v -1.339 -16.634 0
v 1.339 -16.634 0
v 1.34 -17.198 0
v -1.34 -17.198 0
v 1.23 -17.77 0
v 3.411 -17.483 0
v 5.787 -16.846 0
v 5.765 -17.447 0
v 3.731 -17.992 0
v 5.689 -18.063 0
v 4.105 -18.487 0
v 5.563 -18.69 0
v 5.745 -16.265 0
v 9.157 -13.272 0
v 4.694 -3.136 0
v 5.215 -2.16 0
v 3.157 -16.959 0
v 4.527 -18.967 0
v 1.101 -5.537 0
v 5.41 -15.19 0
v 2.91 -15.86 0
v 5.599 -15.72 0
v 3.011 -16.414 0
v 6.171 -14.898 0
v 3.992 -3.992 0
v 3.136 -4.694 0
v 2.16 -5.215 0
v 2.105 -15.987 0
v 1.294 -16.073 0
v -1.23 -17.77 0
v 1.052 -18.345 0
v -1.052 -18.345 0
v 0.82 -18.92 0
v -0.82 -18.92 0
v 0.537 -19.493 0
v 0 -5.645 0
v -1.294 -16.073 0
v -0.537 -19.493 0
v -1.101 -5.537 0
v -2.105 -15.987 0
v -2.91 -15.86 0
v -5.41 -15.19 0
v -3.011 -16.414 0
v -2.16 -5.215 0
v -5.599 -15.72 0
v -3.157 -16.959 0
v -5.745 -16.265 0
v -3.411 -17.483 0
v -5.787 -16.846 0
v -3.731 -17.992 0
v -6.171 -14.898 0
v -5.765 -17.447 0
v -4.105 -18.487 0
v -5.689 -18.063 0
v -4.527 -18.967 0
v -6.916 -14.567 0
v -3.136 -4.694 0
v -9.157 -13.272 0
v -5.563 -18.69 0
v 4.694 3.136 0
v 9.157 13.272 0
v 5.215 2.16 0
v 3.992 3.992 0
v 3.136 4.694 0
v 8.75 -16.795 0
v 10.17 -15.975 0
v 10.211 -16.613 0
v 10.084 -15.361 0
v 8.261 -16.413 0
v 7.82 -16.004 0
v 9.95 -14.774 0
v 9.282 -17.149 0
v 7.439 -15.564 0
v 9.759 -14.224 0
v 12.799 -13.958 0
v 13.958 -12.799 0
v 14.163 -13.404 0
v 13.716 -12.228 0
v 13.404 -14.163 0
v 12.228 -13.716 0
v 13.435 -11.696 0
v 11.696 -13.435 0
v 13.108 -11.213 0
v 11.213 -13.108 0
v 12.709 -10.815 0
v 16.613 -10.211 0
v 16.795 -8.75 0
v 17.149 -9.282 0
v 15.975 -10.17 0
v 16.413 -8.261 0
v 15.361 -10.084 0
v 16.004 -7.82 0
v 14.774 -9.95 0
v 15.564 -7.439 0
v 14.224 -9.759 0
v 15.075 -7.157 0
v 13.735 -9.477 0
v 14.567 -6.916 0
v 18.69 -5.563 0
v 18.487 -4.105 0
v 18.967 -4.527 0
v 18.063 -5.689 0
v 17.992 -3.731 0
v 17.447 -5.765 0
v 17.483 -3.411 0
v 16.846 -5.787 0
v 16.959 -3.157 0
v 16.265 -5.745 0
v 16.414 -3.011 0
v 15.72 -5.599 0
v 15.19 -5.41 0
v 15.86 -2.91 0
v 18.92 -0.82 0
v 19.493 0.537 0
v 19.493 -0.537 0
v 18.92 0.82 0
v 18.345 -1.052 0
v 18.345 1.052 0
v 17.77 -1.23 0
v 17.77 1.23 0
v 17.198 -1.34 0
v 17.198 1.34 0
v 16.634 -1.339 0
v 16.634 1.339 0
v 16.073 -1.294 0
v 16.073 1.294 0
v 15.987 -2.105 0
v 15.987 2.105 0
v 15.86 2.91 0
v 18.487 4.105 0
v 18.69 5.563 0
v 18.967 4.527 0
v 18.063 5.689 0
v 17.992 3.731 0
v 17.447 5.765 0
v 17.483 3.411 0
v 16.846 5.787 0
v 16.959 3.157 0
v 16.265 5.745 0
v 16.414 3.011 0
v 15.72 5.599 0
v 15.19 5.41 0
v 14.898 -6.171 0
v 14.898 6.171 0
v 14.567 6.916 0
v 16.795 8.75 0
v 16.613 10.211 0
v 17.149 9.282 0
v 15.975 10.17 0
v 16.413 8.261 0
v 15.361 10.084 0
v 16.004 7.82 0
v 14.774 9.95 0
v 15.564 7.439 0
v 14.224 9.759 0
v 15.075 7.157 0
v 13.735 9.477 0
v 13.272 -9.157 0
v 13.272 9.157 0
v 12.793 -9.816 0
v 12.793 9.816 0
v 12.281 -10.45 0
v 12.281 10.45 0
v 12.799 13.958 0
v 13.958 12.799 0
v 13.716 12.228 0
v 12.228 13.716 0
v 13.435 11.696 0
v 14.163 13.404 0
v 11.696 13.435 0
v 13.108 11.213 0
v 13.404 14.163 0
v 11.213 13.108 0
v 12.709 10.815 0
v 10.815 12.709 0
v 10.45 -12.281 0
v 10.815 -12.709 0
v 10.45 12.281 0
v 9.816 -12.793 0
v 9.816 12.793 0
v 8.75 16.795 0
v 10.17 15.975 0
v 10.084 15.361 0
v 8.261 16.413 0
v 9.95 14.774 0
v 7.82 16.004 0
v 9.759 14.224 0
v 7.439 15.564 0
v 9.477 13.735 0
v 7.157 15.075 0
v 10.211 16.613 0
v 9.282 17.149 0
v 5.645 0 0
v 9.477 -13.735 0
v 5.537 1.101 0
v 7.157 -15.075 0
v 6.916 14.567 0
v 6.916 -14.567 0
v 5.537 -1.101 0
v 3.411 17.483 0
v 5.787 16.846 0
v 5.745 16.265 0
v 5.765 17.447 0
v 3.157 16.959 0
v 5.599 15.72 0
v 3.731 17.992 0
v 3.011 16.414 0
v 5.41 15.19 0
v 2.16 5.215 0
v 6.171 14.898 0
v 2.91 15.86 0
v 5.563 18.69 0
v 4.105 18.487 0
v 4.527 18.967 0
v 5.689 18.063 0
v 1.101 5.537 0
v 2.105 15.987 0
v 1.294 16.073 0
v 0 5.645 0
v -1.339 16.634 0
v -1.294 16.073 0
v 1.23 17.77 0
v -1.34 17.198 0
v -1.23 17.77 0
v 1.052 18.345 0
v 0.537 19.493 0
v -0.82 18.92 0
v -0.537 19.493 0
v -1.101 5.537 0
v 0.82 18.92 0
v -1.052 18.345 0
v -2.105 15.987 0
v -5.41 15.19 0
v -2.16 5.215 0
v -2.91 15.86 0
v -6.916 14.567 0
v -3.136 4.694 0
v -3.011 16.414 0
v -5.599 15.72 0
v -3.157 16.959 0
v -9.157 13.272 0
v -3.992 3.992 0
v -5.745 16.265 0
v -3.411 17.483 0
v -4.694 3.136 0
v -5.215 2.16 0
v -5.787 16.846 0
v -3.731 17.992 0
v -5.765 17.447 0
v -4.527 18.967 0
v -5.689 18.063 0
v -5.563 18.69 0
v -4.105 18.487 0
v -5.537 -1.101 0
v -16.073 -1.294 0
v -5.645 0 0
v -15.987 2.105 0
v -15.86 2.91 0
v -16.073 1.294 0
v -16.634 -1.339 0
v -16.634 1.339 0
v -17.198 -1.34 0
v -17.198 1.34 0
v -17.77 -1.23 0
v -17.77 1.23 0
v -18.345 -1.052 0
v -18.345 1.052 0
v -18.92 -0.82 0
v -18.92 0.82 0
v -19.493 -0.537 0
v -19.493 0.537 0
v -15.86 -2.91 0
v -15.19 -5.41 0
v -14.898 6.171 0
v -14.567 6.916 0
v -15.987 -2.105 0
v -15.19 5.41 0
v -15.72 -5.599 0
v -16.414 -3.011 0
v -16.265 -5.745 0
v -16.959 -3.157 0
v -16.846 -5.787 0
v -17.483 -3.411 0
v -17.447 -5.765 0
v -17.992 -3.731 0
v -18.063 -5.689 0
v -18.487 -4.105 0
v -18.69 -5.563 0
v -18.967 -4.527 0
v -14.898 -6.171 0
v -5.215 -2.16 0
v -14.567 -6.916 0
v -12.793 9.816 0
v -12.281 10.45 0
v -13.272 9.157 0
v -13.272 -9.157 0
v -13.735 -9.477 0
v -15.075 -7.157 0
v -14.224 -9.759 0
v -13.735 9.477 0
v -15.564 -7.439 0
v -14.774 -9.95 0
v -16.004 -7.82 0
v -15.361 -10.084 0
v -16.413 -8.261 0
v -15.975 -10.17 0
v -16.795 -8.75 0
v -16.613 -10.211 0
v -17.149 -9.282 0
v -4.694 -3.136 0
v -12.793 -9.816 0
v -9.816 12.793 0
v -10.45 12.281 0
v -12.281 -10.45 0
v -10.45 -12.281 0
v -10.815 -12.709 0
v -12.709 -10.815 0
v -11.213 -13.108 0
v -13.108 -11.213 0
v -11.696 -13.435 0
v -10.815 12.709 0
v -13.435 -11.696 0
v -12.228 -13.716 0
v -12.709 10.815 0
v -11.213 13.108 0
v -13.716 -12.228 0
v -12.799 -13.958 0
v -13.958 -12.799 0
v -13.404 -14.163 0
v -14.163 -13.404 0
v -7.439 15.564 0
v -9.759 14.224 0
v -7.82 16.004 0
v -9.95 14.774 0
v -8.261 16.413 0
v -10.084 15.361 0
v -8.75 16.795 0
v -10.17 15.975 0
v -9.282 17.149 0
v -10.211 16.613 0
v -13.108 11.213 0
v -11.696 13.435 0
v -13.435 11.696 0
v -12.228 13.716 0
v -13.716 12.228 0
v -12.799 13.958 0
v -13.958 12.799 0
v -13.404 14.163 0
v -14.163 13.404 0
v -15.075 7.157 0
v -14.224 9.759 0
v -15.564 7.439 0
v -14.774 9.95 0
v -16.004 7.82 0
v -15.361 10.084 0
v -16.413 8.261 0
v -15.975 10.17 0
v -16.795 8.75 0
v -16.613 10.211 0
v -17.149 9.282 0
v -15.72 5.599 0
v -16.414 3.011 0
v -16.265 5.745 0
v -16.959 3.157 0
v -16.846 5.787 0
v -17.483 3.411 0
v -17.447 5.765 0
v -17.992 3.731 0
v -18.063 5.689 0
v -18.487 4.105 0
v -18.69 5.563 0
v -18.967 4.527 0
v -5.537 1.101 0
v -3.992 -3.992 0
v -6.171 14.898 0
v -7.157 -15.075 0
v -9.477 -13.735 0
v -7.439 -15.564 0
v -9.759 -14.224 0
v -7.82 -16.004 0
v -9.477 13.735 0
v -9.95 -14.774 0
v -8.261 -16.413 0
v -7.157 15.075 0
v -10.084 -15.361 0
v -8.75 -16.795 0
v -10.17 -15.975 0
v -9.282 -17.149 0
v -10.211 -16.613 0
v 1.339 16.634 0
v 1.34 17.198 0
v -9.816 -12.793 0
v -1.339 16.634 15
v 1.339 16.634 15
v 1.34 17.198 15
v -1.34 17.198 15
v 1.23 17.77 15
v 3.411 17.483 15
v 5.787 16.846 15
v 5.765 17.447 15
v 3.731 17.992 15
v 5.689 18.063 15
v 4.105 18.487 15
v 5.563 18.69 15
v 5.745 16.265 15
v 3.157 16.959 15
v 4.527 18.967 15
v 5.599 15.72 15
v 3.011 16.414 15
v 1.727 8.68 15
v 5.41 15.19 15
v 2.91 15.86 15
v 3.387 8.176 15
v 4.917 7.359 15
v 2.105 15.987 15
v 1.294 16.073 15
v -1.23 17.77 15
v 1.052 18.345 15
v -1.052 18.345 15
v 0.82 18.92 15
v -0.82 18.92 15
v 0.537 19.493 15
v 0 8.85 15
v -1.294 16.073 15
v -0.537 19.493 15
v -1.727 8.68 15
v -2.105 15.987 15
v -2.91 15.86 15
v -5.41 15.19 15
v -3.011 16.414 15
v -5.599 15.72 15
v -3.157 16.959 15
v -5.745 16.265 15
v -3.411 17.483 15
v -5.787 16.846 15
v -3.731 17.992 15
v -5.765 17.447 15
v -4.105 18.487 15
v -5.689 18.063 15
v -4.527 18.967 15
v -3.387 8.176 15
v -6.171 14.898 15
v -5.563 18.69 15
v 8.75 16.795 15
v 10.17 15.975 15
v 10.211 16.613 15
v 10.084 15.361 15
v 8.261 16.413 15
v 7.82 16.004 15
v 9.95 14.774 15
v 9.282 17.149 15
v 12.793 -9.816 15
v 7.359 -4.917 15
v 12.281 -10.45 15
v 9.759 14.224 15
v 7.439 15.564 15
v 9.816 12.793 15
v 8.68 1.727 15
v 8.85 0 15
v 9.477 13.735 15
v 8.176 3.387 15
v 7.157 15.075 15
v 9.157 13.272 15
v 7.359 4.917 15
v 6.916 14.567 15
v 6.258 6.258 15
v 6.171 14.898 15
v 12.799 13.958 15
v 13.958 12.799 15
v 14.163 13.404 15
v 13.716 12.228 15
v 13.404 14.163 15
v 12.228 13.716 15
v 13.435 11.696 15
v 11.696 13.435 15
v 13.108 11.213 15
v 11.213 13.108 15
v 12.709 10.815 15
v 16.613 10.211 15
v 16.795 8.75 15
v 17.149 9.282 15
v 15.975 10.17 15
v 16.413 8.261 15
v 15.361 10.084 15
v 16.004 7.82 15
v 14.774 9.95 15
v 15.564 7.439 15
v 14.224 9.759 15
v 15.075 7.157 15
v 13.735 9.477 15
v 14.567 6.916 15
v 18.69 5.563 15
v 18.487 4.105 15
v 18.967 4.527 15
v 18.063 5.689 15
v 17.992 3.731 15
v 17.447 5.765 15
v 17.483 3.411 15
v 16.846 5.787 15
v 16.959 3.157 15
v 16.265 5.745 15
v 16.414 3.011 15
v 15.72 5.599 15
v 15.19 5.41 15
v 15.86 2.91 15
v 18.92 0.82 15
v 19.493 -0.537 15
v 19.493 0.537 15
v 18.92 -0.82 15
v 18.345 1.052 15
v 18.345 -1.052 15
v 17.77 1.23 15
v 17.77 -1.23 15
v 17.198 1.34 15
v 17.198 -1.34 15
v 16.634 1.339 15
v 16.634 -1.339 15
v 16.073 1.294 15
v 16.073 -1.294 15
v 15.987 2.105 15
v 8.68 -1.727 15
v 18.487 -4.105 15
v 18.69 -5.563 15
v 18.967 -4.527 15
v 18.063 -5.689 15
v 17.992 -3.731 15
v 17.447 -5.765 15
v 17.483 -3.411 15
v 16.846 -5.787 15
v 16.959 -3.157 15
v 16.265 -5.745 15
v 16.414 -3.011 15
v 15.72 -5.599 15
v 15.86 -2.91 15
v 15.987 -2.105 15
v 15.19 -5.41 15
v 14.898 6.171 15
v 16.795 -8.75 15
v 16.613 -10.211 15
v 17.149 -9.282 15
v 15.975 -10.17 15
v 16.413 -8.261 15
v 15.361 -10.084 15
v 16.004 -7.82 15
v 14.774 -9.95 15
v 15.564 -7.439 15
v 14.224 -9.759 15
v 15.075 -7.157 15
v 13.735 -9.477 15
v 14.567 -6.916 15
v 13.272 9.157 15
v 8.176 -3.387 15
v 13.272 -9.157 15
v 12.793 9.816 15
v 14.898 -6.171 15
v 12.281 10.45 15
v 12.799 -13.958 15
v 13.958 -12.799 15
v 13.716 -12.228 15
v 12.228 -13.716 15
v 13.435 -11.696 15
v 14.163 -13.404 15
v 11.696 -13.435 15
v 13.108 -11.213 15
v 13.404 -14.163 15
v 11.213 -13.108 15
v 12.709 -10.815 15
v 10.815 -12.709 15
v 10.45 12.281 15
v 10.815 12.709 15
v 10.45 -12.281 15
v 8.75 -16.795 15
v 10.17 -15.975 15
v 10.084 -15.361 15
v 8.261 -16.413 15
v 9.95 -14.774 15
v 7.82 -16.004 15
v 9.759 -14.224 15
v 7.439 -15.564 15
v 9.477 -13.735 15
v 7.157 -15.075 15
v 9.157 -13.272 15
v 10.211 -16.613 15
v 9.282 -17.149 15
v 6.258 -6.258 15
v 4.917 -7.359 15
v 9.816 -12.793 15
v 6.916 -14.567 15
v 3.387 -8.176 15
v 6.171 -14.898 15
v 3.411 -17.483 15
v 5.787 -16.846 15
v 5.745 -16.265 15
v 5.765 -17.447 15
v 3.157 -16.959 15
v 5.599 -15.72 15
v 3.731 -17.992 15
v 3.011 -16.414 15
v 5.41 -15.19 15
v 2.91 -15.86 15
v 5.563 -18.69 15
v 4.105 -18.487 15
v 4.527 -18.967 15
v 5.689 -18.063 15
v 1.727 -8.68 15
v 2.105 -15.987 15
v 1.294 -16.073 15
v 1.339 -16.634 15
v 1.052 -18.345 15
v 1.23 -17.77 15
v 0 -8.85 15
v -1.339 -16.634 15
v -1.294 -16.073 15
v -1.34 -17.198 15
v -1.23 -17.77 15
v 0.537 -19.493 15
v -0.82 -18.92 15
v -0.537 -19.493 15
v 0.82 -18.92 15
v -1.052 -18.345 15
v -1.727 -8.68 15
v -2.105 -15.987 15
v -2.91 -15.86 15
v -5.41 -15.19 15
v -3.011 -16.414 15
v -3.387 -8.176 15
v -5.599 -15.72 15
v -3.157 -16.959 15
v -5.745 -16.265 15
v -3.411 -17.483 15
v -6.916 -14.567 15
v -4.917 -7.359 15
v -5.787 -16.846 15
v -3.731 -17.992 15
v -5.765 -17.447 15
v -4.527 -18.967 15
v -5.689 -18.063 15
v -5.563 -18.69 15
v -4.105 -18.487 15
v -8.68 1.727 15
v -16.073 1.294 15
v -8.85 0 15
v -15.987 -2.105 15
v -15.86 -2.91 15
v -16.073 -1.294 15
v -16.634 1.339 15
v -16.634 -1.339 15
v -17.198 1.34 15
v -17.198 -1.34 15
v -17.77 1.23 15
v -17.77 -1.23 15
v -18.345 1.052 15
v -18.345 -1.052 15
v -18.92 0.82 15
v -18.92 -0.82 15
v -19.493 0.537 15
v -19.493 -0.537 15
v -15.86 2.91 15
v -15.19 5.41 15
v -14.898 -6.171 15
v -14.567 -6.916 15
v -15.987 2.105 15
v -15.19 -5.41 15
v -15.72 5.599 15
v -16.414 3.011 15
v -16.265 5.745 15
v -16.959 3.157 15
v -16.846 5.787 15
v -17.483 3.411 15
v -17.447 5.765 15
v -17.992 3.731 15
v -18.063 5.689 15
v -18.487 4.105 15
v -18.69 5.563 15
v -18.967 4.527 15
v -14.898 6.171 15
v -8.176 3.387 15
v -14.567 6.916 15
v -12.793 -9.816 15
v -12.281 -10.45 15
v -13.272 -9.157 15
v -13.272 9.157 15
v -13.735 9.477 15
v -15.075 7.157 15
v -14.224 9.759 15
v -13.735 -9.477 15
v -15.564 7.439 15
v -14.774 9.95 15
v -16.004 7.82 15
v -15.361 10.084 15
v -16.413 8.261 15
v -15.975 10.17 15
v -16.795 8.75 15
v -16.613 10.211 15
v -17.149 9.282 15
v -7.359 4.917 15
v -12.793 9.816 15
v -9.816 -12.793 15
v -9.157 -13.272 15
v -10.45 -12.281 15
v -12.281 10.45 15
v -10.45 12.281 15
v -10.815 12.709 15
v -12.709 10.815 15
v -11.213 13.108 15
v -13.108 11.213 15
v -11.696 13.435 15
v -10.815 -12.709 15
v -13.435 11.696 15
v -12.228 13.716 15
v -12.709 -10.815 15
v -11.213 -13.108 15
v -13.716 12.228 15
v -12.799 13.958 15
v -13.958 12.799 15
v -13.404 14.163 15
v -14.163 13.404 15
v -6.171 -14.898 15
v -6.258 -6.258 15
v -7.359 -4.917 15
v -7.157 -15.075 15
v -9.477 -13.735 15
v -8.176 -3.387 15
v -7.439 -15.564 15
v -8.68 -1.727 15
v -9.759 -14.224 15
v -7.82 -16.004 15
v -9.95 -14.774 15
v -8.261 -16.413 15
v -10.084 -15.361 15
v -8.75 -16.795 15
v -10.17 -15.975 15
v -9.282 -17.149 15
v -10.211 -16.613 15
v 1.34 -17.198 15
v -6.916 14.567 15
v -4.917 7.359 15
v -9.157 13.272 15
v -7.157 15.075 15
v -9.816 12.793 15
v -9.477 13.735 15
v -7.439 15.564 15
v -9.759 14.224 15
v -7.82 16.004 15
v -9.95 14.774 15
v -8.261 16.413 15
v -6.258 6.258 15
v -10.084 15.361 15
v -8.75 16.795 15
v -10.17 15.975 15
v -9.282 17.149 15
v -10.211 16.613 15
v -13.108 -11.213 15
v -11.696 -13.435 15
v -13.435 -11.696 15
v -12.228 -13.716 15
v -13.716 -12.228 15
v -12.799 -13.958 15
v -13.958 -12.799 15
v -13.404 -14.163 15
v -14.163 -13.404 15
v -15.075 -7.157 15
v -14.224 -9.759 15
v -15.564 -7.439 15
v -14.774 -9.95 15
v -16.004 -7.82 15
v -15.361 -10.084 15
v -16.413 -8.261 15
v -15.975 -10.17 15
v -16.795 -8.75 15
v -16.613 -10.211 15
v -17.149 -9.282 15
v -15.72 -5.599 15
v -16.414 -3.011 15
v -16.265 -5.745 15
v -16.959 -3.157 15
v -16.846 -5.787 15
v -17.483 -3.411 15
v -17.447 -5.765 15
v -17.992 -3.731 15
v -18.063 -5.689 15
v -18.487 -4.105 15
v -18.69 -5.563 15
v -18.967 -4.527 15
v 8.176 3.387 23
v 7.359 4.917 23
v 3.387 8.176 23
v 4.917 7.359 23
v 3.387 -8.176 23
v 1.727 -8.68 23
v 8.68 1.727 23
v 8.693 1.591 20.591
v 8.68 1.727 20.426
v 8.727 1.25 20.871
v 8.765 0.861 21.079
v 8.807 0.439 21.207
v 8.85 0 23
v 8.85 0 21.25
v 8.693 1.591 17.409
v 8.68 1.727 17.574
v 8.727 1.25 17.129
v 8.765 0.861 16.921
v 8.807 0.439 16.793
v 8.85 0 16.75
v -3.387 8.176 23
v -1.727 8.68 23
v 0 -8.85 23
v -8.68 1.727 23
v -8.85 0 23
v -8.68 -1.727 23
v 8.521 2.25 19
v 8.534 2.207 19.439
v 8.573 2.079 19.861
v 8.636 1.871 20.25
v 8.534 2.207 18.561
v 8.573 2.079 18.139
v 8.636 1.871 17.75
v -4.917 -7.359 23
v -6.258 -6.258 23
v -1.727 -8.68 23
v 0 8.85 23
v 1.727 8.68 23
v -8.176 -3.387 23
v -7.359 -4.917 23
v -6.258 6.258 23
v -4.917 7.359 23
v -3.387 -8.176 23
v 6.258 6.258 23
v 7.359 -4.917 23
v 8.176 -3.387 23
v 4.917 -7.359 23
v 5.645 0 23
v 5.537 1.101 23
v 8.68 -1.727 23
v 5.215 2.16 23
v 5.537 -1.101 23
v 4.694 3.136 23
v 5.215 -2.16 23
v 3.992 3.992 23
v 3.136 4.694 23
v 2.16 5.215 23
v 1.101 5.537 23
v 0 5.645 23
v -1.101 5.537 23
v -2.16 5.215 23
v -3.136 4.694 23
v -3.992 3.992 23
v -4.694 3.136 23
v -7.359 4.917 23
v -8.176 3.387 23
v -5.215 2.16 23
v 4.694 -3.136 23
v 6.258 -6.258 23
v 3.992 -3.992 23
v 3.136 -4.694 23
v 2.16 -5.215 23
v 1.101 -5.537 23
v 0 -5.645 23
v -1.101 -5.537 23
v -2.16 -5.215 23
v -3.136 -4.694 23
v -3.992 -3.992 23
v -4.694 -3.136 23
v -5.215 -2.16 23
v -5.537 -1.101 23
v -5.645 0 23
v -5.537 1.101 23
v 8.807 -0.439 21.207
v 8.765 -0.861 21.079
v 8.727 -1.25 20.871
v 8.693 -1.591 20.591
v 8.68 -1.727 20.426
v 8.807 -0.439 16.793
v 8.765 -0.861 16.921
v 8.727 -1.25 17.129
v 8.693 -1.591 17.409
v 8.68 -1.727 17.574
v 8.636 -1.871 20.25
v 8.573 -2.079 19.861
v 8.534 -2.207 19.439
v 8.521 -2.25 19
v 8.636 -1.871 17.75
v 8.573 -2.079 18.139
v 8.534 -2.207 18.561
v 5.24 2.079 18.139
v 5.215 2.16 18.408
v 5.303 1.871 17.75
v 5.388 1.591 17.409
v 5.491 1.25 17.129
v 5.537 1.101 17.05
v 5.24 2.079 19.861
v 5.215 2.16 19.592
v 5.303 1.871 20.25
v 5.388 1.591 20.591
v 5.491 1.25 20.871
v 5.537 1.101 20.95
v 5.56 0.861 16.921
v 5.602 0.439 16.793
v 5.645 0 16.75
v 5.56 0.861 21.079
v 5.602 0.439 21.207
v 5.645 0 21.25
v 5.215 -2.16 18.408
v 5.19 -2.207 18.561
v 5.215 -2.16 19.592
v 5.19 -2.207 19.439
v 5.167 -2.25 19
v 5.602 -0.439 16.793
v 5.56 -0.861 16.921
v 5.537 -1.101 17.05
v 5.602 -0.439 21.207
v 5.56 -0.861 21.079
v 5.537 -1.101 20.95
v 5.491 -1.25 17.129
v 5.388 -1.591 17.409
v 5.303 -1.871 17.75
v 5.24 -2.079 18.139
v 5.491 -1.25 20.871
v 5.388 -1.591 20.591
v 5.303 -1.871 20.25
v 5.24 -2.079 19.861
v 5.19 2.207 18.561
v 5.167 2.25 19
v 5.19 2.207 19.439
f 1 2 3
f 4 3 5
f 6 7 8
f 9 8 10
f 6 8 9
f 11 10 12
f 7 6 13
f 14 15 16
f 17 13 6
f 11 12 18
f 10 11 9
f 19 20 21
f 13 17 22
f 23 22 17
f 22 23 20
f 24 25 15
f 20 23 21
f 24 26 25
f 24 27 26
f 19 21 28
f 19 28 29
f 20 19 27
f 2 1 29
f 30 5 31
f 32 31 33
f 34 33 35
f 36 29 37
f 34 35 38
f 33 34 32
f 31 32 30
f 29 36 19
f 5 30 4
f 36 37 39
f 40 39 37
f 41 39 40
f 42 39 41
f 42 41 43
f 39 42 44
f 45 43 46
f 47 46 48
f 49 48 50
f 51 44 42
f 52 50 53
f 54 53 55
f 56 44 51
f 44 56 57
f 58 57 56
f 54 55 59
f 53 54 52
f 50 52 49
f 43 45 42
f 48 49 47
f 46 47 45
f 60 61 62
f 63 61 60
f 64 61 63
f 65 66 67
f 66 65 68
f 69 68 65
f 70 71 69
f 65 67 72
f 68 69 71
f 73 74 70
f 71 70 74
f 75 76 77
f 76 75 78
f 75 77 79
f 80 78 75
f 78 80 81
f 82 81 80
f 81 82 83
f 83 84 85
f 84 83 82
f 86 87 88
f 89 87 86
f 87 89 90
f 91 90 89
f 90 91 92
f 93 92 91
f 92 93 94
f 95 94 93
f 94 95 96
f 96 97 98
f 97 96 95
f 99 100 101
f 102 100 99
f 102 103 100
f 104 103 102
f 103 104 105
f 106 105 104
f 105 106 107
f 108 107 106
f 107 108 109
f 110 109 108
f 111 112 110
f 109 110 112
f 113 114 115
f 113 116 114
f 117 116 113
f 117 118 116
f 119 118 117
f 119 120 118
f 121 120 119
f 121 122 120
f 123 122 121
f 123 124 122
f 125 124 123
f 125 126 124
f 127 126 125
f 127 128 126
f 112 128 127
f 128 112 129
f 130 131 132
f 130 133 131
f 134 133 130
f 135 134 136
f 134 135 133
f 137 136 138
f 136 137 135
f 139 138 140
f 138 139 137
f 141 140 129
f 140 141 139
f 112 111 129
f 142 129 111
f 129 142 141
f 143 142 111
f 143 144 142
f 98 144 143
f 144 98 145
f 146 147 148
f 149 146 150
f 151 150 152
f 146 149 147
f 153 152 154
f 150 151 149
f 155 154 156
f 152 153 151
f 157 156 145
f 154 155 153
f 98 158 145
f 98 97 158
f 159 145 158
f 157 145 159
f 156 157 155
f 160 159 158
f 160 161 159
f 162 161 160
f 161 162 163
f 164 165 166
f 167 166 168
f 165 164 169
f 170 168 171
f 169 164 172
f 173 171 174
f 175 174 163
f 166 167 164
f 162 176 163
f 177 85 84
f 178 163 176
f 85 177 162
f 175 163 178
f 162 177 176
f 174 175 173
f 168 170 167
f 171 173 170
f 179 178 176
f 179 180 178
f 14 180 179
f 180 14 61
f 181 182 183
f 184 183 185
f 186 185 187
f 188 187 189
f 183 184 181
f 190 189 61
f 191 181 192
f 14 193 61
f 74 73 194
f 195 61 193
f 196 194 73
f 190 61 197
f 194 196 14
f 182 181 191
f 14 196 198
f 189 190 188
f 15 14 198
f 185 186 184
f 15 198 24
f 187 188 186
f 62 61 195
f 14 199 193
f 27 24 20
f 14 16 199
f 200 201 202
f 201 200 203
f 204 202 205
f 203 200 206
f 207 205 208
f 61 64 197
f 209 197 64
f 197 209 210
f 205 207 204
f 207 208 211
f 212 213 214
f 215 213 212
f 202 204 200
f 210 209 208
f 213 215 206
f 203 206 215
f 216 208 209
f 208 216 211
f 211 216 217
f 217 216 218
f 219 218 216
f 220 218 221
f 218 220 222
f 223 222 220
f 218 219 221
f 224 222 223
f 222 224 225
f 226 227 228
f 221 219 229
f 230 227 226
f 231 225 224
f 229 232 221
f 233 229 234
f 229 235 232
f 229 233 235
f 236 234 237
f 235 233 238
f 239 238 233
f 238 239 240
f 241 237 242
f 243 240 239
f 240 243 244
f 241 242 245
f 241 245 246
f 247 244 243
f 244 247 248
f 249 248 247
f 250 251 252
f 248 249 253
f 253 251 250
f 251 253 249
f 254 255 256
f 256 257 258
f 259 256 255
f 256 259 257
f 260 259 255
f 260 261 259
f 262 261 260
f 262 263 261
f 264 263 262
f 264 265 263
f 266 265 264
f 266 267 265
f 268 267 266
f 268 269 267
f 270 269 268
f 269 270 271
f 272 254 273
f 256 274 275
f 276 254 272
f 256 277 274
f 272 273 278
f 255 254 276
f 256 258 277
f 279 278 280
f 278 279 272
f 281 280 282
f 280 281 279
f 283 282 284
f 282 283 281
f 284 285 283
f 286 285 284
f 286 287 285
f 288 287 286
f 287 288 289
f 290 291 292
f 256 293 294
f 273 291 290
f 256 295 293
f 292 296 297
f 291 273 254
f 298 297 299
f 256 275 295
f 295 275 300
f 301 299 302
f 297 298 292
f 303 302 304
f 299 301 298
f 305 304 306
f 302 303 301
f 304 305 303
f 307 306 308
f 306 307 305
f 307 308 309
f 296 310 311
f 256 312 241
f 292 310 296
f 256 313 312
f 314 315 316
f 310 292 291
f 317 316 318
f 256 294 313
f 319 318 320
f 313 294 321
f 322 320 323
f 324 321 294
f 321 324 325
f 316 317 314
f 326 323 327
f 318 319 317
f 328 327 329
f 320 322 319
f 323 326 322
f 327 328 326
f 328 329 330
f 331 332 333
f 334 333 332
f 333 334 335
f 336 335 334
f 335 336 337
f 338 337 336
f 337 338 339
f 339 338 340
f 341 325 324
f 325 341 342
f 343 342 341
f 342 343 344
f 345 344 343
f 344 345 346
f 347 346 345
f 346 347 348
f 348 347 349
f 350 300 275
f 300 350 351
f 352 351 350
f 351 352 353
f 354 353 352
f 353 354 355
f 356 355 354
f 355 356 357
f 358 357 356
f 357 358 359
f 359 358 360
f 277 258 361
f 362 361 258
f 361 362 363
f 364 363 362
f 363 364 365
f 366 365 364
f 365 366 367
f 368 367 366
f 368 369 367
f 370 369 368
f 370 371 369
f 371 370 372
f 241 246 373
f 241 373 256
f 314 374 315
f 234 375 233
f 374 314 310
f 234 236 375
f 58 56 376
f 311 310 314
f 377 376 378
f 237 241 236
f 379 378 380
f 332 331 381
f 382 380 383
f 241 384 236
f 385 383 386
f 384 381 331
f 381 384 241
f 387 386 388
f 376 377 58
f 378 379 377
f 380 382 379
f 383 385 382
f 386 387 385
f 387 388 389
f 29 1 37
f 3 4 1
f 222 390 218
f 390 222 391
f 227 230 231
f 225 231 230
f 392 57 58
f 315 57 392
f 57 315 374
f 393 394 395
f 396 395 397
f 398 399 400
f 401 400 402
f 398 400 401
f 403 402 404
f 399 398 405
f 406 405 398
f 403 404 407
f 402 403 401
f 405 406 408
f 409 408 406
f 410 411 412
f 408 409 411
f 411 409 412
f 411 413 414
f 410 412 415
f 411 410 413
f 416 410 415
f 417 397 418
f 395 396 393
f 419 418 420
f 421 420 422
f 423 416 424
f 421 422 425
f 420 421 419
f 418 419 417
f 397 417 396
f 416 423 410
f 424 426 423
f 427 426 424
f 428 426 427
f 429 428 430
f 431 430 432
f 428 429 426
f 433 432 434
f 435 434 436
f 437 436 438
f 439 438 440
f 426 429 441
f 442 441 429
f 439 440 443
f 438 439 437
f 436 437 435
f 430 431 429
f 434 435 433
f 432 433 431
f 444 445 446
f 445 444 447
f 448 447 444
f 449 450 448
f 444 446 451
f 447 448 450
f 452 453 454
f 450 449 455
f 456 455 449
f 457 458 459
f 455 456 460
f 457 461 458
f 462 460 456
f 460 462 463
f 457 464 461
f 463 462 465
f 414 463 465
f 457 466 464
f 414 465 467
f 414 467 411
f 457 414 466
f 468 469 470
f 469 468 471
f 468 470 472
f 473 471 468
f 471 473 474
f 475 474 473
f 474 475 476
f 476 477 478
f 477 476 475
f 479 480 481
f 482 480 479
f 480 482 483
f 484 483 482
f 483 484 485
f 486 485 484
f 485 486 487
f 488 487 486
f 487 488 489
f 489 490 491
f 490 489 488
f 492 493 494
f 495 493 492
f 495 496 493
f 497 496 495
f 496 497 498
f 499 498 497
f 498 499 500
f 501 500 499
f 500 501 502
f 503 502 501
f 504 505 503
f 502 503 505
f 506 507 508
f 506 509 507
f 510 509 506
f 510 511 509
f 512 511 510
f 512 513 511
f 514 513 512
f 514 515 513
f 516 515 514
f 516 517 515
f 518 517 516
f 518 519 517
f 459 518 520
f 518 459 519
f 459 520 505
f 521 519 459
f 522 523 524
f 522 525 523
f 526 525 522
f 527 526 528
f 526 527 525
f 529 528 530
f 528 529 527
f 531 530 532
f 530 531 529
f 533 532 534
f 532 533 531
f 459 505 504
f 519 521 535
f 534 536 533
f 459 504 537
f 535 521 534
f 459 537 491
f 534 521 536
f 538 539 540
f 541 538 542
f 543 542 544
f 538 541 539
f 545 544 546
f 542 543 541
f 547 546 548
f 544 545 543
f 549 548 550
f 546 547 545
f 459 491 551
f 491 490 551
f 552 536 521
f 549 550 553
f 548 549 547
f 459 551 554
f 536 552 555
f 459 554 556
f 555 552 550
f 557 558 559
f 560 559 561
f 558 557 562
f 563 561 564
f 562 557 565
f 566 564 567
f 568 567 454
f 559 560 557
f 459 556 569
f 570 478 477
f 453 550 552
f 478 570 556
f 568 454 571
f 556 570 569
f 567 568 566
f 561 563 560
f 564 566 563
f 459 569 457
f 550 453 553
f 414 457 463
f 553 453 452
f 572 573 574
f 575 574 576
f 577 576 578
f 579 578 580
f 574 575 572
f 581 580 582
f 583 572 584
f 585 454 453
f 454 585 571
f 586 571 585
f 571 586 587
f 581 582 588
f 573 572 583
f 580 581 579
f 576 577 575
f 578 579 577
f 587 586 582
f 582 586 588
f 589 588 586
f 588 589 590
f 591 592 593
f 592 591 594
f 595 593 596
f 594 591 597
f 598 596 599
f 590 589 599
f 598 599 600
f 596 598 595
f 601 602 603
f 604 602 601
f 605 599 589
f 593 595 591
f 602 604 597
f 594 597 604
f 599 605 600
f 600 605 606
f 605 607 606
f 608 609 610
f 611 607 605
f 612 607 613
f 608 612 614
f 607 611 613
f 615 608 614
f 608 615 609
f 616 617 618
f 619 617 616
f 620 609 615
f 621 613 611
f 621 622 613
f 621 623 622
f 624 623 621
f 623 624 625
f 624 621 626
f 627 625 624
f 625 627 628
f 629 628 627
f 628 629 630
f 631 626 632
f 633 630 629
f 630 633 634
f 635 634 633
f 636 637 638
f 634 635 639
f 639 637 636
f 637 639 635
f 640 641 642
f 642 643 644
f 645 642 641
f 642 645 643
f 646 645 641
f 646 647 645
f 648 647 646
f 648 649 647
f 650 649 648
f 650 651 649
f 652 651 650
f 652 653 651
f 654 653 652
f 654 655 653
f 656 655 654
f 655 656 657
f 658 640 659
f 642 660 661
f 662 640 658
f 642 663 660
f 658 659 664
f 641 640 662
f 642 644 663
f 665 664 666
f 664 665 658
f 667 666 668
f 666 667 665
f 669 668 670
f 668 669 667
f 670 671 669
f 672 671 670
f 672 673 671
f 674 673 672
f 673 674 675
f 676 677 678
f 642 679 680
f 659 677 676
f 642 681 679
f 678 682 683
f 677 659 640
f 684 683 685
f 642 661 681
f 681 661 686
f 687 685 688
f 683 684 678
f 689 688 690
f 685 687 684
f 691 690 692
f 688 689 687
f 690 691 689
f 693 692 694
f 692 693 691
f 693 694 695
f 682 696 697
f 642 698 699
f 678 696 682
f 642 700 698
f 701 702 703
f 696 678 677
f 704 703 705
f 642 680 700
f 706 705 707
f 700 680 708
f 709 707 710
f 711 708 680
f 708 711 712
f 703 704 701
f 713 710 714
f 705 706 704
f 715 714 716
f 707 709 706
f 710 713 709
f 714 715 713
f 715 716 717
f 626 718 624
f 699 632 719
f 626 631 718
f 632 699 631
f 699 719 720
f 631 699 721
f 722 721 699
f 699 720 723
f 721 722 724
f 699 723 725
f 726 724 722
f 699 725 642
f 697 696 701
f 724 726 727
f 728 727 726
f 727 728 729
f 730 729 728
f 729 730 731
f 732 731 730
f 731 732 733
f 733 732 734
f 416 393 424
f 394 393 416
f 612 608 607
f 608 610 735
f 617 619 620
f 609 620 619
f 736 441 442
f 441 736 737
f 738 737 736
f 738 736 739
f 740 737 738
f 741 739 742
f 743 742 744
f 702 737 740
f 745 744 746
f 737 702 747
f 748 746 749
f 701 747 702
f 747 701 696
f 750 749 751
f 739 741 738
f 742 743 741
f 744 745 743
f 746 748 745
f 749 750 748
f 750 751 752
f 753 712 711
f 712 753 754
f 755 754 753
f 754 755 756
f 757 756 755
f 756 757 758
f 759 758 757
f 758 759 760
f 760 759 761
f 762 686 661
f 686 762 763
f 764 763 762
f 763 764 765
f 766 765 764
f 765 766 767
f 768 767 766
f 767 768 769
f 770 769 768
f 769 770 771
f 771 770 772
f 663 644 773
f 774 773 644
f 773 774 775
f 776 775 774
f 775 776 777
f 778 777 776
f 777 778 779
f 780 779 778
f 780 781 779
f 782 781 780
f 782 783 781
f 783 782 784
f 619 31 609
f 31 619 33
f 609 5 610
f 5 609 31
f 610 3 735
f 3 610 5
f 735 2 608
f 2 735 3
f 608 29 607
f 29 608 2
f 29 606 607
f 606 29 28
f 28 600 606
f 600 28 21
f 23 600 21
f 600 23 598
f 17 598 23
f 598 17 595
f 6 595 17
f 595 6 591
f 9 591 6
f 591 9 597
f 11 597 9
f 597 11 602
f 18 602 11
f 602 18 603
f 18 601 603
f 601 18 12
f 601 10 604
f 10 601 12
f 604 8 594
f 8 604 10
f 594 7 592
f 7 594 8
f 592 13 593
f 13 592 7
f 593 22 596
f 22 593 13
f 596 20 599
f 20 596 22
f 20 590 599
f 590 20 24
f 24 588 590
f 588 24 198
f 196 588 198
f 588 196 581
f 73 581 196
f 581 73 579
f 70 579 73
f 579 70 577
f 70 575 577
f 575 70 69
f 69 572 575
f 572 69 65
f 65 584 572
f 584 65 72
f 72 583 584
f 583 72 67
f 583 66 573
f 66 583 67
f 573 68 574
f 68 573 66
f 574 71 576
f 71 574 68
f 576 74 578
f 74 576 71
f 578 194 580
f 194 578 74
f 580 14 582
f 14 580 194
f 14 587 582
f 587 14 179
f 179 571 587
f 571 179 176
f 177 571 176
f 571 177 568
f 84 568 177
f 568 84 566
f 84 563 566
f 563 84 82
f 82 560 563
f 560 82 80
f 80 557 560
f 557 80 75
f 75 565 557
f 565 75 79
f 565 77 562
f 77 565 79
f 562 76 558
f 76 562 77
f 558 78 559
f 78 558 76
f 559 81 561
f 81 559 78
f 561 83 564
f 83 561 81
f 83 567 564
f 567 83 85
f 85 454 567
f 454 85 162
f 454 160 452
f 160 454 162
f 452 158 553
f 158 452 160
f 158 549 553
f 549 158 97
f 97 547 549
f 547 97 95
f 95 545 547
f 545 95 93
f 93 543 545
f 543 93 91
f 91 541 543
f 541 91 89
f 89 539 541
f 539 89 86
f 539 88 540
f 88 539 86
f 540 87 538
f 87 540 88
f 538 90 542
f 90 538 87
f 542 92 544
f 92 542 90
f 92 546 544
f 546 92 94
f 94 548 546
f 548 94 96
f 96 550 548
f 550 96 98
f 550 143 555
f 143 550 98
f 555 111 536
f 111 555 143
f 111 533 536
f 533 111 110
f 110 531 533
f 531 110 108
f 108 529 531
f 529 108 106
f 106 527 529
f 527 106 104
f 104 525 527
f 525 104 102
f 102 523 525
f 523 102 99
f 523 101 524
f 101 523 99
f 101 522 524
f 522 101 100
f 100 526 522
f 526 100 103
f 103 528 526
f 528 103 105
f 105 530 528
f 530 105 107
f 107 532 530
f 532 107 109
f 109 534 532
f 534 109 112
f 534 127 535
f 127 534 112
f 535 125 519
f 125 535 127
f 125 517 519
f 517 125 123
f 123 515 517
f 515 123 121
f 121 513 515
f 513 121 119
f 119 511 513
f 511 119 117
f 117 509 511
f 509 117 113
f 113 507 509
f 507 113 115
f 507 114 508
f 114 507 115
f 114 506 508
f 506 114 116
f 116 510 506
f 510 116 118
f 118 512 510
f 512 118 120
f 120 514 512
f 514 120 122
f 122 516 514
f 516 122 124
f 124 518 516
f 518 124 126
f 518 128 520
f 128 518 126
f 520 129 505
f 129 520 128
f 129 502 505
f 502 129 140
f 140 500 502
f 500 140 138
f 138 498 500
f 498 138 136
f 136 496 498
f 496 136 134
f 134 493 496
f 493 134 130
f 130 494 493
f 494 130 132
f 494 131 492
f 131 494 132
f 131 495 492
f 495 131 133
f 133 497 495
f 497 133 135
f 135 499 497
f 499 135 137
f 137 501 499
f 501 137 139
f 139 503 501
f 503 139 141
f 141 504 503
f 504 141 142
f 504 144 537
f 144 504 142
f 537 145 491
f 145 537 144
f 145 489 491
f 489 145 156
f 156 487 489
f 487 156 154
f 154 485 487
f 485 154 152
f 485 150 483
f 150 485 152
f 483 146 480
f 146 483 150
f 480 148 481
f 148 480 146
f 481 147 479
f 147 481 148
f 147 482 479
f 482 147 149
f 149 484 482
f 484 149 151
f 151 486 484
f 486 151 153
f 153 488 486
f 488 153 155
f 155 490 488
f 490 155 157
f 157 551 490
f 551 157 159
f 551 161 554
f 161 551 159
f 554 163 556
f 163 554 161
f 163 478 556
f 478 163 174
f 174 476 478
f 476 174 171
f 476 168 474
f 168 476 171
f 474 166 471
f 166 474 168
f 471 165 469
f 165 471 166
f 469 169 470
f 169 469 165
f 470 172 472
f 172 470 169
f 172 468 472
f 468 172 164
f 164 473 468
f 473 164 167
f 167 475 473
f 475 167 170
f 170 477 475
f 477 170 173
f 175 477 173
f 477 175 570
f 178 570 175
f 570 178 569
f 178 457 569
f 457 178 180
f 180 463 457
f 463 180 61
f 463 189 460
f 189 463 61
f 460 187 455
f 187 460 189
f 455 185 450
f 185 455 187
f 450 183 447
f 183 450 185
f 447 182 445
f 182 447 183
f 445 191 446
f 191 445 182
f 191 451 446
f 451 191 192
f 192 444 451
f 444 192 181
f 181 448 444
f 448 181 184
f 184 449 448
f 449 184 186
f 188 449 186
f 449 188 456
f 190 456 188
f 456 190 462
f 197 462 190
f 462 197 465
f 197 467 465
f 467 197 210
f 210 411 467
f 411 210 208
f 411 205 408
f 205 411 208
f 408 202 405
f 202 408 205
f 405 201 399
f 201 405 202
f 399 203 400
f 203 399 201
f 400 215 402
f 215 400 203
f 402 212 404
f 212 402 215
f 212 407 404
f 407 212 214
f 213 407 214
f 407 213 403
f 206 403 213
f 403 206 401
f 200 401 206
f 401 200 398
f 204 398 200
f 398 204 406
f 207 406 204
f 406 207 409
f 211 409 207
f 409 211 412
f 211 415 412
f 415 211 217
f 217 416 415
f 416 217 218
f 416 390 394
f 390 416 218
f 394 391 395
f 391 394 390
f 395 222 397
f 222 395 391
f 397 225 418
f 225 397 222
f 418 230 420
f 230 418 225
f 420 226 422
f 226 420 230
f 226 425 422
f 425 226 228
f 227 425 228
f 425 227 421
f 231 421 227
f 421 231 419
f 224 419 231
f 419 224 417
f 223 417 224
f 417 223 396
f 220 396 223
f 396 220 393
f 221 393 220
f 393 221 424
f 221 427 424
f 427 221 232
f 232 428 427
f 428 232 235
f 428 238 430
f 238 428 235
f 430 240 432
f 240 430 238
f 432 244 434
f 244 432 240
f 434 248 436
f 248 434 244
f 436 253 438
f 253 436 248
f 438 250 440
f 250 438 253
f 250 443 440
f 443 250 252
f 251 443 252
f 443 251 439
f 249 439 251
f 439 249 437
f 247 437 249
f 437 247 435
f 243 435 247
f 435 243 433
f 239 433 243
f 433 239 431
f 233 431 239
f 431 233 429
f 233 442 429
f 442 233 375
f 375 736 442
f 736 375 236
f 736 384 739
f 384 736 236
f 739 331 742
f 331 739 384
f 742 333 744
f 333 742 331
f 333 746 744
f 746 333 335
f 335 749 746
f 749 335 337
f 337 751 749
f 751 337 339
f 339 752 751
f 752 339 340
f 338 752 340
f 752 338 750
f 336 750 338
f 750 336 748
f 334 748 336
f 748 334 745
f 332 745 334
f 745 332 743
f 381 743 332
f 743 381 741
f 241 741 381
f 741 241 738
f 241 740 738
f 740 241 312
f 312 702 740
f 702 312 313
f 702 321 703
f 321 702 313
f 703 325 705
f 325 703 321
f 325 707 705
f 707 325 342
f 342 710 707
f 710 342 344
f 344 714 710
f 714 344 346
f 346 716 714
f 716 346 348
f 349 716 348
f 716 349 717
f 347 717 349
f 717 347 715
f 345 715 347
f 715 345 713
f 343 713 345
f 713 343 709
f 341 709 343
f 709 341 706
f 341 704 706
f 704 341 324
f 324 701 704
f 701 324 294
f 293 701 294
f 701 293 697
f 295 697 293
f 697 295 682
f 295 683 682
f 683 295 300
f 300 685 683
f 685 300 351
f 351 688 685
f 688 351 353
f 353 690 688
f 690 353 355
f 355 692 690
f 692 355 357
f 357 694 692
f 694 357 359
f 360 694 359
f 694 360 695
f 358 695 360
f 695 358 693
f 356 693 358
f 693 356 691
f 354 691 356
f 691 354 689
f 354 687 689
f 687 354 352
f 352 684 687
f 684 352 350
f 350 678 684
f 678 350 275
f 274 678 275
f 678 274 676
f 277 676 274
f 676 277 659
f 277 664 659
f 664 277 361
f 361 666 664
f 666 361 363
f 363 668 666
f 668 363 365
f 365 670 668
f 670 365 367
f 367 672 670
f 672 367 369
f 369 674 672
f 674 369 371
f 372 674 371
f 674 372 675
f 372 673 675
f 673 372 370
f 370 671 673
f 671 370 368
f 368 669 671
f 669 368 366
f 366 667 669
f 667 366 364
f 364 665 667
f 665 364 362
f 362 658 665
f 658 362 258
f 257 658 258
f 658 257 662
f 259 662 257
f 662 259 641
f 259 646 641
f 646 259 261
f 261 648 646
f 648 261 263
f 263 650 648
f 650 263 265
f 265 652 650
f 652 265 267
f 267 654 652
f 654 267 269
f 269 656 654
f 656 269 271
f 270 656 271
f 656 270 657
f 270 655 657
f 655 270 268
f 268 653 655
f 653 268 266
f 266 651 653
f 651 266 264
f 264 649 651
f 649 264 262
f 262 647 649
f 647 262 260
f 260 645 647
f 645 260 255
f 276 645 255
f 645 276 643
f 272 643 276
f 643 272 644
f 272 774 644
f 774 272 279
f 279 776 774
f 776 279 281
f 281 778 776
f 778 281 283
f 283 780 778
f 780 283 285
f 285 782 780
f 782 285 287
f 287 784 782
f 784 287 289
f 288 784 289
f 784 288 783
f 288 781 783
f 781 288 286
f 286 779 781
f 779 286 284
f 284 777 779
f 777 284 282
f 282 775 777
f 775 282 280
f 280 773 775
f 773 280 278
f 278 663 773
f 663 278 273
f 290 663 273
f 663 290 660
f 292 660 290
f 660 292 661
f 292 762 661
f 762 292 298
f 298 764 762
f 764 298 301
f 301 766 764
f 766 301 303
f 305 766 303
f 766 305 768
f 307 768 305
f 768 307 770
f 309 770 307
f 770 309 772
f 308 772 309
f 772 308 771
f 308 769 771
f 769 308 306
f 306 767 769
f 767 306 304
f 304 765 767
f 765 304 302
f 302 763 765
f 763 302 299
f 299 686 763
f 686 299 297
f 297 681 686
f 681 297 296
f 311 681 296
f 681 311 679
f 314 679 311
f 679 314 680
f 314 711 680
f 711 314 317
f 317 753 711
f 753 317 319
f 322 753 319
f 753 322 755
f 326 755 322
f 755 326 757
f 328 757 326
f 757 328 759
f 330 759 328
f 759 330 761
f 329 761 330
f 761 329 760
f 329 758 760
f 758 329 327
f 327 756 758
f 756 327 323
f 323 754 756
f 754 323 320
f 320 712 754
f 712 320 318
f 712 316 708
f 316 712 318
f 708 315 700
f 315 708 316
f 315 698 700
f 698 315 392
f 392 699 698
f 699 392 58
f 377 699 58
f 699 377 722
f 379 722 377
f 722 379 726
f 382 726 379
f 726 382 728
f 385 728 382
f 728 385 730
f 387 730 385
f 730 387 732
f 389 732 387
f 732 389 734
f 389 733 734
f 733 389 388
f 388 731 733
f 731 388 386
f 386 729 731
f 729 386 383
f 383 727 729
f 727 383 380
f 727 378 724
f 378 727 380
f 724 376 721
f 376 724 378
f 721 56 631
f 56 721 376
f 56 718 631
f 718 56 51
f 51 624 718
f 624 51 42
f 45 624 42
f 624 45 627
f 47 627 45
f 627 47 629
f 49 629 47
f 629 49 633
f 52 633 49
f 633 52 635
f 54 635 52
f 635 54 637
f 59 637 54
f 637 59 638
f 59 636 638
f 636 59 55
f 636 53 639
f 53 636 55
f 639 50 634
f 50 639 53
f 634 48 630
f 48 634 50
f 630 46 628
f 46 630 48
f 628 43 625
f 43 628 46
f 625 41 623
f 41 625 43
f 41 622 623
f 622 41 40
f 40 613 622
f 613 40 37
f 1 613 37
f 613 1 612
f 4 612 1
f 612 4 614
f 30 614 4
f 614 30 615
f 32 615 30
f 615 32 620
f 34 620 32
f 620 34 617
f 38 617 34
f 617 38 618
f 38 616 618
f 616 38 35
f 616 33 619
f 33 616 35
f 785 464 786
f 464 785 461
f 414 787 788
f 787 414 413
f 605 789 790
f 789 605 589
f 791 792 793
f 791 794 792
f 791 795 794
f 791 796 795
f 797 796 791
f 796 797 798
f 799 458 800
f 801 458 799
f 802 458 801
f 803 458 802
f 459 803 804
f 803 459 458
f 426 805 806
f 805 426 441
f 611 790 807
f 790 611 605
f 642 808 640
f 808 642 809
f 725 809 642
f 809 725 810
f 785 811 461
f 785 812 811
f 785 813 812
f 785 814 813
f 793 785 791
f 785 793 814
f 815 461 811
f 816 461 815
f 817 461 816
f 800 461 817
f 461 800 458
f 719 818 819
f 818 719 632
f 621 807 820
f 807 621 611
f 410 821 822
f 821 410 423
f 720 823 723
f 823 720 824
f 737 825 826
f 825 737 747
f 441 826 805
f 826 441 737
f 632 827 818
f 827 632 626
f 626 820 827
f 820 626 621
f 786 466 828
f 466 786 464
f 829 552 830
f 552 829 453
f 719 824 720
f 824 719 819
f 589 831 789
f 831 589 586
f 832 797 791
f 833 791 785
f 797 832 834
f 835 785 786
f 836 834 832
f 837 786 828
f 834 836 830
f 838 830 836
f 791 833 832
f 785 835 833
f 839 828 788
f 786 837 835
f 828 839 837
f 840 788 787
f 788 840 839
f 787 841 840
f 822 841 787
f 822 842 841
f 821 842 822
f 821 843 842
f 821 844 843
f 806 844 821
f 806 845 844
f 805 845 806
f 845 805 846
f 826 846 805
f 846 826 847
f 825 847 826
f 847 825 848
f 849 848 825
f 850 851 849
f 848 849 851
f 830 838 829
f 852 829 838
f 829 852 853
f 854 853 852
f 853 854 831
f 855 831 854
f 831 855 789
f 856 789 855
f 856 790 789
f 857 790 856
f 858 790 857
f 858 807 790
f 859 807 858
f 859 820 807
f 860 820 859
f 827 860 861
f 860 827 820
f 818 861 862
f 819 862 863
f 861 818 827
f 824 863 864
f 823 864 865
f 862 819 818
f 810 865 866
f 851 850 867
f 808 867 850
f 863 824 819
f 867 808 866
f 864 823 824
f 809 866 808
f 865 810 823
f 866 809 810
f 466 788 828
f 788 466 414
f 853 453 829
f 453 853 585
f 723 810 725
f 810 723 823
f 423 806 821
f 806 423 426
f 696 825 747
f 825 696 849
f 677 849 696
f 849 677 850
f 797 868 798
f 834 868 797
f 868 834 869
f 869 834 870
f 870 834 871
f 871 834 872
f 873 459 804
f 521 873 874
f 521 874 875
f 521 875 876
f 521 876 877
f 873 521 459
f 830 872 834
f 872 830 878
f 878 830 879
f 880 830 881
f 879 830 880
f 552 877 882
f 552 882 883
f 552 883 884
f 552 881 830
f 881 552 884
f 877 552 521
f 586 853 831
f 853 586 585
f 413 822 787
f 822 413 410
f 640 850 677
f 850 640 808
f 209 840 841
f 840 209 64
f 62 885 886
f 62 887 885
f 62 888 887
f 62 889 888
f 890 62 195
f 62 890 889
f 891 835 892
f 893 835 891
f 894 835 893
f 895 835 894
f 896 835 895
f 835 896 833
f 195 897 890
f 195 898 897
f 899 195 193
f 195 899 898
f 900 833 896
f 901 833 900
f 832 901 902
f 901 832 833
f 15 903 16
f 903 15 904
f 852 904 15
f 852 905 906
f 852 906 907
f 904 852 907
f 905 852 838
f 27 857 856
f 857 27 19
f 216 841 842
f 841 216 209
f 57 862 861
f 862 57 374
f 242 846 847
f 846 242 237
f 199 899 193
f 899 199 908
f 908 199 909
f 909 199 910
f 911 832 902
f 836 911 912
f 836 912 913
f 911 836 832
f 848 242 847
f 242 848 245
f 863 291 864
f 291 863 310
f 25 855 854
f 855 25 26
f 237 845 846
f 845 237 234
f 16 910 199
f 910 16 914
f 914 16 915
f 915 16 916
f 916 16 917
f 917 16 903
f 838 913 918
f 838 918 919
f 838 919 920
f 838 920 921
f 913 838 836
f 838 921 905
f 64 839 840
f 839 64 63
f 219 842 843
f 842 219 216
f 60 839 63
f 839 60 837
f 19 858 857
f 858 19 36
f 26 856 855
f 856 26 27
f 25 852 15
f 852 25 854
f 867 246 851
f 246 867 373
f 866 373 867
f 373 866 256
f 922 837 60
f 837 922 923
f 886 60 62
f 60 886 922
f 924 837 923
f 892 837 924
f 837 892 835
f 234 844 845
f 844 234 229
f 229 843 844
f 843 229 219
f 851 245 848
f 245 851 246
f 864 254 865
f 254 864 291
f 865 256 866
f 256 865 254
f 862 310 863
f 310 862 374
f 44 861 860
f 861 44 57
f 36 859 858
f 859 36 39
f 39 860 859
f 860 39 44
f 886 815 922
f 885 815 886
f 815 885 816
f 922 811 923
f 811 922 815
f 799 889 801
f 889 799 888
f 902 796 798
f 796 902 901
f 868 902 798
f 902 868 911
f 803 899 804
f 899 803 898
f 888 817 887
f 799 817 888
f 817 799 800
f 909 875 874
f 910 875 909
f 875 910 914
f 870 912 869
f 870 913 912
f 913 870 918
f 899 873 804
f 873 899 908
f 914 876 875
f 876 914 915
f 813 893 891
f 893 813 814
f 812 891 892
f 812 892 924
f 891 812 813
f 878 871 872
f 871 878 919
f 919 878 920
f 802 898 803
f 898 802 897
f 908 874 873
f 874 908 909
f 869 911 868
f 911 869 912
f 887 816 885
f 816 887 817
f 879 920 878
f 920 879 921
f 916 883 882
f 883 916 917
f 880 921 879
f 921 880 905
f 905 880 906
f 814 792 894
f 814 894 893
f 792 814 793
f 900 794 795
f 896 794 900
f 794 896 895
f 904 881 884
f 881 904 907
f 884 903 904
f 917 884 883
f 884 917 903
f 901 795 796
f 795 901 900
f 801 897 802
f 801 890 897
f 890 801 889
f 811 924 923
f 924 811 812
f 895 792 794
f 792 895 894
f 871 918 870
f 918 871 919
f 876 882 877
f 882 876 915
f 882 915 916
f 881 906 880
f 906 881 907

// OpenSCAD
$fn = 32;

// ----------------------------------------------------------------------
// Spur gear: m=1.5 z=24, 39 mm tip diameter x 23 mm
// ----------------------------------------------------------------------

// --- parameters (mm) ---
gear_module = 1.5;        // module
tooth_count = 24;         // number of teeth
gear_w = 15;              // face width
pa = 20;                  // pressure angle, deg
bore = 11.29;             // shaft bore
hub_dia = 17.7;           // hub diameter
hub_len = 8;              // hub above the face
set_d = 4.5;              // set screw tap hole
set_z = 19;               // set screw height

/* --- involute profile --- */
pitch_r = gear_module * tooth_count / 2;
base_r = pitch_r * cos(pa);
tip_r = pitch_r + gear_module;
root_r = pitch_r - 1.25 * gear_module;
flank_steps = 6;

function inv_deg(a) = (tan(a) - a * PI / 180) * 180 / PI;
function flank_r(i) = root_r + (tip_r - root_r) * i / flank_steps;
function half_angle(r) = 90 / tooth_count + inv_deg(pa) - inv_deg(acos(min(1, base_r / r)));
function tooth_pt(k, i, side) =
    let (r = flank_r(i), a = k * 360 / tooth_count + side * half_angle(r))
    [r * cos(a), r * sin(a)];

module tooth_profile() {
  polygon(points = [
    for (k = [0 : tooth_count - 1])
      each [
        for (i = [0 : flank_steps]) tooth_pt(k, i, -1),
        for (i = [flank_steps : -1 : 0]) tooth_pt(k, i, 1),
        let (ta = (k + 0.5) * 360 / tooth_count)
          [root_r * cos(ta), root_r * sin(ta)]
      ]
  ]);
}

module gear_disc() {
  linear_extrude(height = gear_w) tooth_profile();
}

module hub_boss() {
  translate([0, 0, gear_w - 1]) cylinder(h = hub_len + 1, d = hub_dia);
}

difference() {
  union() {
    gear_disc();
    hub_boss();
  }
  translate([0, 0, -1]) cylinder(h = gear_w + hub_len + 3, d = bore);
  /* set screw, drilled radially */
  translate([-1, 0, set_z]) rotate([0, 90, 0]) cylinder(h = hub_dia / 2 + 3, d = set_d);
}
